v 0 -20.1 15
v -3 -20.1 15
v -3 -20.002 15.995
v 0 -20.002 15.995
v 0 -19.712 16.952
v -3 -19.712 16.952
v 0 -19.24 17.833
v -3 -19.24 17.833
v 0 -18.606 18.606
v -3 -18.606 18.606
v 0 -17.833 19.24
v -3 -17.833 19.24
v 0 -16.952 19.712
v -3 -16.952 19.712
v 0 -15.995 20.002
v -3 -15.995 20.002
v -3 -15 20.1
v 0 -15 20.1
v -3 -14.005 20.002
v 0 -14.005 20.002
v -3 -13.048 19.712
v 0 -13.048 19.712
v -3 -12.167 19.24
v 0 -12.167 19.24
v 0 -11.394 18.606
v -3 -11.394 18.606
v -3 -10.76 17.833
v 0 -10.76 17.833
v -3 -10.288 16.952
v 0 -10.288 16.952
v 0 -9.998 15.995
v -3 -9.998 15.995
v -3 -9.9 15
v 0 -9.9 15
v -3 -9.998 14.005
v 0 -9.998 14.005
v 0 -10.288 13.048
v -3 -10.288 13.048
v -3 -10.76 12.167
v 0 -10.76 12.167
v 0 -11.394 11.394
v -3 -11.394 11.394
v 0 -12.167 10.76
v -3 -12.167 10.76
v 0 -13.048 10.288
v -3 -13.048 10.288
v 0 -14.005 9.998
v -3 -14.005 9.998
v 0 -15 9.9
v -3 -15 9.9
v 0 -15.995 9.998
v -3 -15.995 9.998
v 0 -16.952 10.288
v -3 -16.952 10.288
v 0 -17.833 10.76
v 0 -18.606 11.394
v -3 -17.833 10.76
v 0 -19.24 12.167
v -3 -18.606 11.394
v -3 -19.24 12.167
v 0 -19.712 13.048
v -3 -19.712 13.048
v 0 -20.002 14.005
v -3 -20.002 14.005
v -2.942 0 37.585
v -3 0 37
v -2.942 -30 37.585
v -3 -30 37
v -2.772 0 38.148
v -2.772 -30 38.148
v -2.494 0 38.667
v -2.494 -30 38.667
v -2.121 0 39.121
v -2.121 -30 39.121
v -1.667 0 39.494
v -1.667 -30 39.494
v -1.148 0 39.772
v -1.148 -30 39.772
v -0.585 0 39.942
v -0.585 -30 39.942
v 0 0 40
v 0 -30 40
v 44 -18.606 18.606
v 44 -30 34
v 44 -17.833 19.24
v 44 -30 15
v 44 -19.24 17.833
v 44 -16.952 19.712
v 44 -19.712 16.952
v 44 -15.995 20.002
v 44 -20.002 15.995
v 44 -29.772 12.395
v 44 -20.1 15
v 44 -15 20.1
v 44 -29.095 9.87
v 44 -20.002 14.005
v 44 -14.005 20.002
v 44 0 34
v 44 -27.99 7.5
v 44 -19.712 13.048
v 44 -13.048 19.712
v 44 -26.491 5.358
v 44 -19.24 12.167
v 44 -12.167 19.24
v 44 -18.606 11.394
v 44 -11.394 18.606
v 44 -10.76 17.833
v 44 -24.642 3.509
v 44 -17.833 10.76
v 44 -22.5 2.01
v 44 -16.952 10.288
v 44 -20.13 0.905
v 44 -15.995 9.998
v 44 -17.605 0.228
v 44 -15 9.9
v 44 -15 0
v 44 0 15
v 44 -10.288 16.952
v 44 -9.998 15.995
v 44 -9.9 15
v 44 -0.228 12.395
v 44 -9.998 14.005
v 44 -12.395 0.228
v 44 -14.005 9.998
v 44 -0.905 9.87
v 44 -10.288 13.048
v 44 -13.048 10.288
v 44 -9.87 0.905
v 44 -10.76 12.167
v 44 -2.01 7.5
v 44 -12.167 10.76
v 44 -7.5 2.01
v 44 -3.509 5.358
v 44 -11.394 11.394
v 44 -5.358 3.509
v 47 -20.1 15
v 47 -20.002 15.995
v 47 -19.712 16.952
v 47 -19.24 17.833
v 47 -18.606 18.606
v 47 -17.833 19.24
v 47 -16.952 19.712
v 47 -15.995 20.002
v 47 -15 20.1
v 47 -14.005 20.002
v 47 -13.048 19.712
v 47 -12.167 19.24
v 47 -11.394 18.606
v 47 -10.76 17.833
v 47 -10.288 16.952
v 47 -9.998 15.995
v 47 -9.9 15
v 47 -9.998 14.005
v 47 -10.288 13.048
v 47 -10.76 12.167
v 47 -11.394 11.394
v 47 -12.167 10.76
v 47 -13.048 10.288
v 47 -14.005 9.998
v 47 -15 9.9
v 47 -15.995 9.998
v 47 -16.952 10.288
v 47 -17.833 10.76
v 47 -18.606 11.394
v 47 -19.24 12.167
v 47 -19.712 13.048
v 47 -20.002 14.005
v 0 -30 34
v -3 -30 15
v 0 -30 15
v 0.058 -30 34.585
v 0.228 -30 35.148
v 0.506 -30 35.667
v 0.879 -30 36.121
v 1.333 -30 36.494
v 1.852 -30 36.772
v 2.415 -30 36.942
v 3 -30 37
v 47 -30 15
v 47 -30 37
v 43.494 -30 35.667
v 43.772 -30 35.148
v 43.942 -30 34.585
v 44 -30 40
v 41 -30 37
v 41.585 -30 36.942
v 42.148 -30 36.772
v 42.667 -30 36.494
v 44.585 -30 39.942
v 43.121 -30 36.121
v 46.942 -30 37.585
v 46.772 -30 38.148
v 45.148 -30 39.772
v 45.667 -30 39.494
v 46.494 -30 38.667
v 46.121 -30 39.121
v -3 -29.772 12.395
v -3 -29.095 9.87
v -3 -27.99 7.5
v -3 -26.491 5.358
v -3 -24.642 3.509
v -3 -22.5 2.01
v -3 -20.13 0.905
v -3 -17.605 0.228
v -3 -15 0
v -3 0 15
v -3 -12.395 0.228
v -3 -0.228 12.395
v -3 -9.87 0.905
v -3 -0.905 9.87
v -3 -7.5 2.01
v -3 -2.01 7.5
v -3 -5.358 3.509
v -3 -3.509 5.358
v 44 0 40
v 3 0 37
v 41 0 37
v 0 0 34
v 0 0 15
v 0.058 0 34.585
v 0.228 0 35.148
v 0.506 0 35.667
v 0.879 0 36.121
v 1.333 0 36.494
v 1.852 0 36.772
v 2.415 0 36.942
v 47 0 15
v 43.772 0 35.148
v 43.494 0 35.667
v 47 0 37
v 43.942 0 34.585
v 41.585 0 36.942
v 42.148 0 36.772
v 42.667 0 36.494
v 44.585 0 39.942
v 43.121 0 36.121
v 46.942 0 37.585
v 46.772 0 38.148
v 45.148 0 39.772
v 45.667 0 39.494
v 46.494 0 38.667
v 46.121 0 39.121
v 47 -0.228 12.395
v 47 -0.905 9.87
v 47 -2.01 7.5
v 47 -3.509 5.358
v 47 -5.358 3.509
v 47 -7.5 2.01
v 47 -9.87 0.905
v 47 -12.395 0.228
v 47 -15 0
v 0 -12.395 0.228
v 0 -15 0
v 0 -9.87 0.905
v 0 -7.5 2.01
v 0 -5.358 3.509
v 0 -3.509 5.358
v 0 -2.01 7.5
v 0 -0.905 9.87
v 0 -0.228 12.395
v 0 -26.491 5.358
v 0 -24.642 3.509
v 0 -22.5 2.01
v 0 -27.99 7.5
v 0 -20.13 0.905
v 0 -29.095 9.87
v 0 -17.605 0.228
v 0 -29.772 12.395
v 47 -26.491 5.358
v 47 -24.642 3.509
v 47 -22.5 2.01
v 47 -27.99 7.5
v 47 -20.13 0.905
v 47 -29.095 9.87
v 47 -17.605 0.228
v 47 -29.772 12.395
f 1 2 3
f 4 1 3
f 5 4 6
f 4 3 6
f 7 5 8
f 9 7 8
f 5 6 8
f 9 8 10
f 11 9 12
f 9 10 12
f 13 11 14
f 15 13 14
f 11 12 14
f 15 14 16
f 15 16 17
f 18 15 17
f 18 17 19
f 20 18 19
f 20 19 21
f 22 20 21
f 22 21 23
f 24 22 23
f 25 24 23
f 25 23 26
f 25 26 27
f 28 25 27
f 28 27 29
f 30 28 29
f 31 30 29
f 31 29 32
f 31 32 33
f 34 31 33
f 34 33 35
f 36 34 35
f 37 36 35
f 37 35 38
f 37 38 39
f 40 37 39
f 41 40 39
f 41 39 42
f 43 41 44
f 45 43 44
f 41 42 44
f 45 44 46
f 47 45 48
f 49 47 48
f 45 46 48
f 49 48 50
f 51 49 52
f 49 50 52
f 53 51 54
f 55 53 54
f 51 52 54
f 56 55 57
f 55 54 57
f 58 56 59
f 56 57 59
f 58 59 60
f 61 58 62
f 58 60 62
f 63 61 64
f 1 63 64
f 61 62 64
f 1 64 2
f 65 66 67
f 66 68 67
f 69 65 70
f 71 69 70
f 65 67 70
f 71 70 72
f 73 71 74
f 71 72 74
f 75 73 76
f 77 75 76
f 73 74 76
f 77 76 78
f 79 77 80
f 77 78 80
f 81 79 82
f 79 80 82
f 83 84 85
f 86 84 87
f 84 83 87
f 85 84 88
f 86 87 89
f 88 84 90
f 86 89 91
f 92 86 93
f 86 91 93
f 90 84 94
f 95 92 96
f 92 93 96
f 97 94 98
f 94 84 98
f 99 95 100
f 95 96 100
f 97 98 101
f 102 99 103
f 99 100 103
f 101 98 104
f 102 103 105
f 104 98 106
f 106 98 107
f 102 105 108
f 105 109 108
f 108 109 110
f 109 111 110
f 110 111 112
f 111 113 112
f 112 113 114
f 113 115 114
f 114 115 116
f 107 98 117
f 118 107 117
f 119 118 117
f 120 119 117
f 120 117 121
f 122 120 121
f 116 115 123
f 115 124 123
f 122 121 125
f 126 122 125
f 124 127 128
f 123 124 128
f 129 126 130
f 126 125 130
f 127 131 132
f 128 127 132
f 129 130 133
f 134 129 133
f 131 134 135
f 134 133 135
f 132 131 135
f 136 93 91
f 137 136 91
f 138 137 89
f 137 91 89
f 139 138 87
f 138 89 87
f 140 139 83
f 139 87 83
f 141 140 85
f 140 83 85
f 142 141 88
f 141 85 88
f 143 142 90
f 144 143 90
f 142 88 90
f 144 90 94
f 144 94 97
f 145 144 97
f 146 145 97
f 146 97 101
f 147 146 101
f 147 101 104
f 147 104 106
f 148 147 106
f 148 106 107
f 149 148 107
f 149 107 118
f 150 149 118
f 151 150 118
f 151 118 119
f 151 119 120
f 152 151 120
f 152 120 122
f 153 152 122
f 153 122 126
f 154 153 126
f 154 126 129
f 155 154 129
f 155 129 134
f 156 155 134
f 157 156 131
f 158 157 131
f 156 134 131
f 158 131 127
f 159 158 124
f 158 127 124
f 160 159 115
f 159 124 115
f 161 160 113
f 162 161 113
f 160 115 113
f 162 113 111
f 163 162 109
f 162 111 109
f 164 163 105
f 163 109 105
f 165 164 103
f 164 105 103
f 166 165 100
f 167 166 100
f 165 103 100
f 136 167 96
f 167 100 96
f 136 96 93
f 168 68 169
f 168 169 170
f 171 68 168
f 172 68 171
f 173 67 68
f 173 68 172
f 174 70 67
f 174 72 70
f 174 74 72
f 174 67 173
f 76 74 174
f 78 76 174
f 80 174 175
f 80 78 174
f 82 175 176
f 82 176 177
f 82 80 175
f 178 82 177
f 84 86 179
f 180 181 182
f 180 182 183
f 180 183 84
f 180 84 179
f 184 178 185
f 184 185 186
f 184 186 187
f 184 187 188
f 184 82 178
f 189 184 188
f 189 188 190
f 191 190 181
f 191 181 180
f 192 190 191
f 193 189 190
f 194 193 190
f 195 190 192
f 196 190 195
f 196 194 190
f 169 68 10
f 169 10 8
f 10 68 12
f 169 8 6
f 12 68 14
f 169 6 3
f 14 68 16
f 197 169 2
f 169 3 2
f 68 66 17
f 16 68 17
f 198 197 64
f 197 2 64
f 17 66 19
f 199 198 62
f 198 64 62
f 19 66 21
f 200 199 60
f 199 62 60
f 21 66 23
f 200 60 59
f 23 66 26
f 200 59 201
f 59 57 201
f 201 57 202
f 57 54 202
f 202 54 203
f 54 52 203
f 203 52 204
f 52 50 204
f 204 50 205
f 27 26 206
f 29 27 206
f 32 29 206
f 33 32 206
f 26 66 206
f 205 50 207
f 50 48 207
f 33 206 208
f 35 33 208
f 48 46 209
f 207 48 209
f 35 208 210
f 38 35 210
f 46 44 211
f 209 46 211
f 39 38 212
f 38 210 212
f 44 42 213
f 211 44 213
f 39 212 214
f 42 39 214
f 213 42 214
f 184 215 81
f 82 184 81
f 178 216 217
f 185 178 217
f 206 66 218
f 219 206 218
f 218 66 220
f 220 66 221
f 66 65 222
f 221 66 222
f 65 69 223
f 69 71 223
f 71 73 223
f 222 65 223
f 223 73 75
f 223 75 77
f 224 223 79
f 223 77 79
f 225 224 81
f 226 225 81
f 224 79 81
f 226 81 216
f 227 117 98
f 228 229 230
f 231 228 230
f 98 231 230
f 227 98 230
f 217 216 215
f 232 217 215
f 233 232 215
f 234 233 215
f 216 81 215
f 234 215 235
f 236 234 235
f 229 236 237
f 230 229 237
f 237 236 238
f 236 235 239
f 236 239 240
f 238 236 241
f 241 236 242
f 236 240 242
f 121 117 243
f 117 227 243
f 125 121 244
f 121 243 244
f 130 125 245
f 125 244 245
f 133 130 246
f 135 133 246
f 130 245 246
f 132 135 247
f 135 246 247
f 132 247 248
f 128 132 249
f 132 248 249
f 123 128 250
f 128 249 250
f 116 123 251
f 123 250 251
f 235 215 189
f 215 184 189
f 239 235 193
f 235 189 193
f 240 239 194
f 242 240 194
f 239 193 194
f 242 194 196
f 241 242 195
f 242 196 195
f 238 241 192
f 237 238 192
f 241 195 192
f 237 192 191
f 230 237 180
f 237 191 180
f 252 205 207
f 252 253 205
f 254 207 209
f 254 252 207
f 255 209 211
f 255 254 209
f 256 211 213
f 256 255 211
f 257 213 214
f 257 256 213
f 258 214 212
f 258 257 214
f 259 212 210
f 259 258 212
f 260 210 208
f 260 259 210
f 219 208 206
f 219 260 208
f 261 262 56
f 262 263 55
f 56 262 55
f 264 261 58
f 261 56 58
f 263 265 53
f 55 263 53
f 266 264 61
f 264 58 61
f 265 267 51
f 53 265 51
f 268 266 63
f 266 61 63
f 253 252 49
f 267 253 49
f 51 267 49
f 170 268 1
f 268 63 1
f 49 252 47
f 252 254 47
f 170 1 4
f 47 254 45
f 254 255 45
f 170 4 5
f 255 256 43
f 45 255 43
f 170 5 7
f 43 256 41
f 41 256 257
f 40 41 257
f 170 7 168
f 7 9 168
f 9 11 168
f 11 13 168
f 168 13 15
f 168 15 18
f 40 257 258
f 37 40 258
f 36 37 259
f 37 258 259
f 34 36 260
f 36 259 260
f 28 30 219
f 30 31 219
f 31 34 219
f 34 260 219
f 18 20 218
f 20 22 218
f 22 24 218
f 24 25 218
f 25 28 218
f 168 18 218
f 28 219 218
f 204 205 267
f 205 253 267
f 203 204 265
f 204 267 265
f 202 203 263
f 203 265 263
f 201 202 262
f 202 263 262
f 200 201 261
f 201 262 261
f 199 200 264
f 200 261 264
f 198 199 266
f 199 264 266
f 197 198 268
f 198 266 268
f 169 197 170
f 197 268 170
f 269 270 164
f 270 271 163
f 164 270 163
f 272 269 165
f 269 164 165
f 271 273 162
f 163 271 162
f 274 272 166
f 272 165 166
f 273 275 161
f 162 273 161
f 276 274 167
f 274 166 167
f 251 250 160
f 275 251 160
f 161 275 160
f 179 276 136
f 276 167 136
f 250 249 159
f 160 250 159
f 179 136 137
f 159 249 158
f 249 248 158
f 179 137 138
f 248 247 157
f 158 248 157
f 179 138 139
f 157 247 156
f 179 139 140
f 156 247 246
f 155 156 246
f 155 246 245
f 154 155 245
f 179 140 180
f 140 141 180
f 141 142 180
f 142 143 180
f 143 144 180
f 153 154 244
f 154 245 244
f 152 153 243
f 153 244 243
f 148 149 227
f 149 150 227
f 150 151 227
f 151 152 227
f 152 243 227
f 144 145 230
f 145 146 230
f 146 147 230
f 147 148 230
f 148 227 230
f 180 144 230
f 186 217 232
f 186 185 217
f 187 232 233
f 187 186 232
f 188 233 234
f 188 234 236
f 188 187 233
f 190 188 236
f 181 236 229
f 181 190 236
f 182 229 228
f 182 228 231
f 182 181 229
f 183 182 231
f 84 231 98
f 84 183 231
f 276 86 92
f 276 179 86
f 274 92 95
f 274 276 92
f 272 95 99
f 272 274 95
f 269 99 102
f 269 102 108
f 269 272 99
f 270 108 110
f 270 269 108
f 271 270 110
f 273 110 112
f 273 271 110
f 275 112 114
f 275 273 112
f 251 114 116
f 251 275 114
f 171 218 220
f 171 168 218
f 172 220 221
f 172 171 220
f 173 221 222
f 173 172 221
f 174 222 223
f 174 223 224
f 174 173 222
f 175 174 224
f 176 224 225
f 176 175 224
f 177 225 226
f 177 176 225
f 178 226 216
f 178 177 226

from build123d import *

# Parameters (mm, degrees)
F1_DEPTH = 30
F2_R     = 5.1
F3_DEPTH = 50.0010000522
F4_R     = 14.99999
F5_R     = 3


# Not quite as in the source:
# - a fillet or chamfer is up to 0.001 mm smaller than in the source, because OpenCascade refuses the exact size


with BuildPart() as f1:
    # F0 (on Front) → F1 (new body)
    with BuildSketch(Plane.XZ):
        Polygon((-3.0000000261, 0), (0, 0), (0, 37), (44, 37), (44, 0), (47.0000000261, 0), (47.0000000261, 40.0000000261), (-3.0000000261, 40.0000000261), align=None)
    extrude(amount=F1_DEPTH)

    # F2 (on face) → F3 (cut, through all)
    with BuildSketch(Plane(origin=(-3.0000000261, 0, 0), x_dir=(0, -1, 0), z_dir=(-1, 0, 0))):
        with Locations((15, 15.0000000261)):
            Circle(F2_R)
    extrude(amount=-F3_DEPTH, mode=Mode.SUBTRACT)

    # F4 (radius 15 in the source; OpenCascade refuses exactly that, so slightly less here)
    f4_edges = [f1.edges().sort_by_distance(p)[0] for p in [
        (45.5, 0, 0),
        (45.5, -30, 0),
        (-1.5, -30, 0),
        (-1.5, 0, 0),
    ]]
    fillet(f4_edges, radius=F4_R)

    # F5
    f5_edges = [f1.edges().sort_by_distance(p)[0] for p in [
        (0, -15, 37),
        (44, -15, 37),
        (47, -15, 40),
        (-3, -15, 40),
    ]]
    fillet(f5_edges, radius=F5_R)


solid = f1.part
